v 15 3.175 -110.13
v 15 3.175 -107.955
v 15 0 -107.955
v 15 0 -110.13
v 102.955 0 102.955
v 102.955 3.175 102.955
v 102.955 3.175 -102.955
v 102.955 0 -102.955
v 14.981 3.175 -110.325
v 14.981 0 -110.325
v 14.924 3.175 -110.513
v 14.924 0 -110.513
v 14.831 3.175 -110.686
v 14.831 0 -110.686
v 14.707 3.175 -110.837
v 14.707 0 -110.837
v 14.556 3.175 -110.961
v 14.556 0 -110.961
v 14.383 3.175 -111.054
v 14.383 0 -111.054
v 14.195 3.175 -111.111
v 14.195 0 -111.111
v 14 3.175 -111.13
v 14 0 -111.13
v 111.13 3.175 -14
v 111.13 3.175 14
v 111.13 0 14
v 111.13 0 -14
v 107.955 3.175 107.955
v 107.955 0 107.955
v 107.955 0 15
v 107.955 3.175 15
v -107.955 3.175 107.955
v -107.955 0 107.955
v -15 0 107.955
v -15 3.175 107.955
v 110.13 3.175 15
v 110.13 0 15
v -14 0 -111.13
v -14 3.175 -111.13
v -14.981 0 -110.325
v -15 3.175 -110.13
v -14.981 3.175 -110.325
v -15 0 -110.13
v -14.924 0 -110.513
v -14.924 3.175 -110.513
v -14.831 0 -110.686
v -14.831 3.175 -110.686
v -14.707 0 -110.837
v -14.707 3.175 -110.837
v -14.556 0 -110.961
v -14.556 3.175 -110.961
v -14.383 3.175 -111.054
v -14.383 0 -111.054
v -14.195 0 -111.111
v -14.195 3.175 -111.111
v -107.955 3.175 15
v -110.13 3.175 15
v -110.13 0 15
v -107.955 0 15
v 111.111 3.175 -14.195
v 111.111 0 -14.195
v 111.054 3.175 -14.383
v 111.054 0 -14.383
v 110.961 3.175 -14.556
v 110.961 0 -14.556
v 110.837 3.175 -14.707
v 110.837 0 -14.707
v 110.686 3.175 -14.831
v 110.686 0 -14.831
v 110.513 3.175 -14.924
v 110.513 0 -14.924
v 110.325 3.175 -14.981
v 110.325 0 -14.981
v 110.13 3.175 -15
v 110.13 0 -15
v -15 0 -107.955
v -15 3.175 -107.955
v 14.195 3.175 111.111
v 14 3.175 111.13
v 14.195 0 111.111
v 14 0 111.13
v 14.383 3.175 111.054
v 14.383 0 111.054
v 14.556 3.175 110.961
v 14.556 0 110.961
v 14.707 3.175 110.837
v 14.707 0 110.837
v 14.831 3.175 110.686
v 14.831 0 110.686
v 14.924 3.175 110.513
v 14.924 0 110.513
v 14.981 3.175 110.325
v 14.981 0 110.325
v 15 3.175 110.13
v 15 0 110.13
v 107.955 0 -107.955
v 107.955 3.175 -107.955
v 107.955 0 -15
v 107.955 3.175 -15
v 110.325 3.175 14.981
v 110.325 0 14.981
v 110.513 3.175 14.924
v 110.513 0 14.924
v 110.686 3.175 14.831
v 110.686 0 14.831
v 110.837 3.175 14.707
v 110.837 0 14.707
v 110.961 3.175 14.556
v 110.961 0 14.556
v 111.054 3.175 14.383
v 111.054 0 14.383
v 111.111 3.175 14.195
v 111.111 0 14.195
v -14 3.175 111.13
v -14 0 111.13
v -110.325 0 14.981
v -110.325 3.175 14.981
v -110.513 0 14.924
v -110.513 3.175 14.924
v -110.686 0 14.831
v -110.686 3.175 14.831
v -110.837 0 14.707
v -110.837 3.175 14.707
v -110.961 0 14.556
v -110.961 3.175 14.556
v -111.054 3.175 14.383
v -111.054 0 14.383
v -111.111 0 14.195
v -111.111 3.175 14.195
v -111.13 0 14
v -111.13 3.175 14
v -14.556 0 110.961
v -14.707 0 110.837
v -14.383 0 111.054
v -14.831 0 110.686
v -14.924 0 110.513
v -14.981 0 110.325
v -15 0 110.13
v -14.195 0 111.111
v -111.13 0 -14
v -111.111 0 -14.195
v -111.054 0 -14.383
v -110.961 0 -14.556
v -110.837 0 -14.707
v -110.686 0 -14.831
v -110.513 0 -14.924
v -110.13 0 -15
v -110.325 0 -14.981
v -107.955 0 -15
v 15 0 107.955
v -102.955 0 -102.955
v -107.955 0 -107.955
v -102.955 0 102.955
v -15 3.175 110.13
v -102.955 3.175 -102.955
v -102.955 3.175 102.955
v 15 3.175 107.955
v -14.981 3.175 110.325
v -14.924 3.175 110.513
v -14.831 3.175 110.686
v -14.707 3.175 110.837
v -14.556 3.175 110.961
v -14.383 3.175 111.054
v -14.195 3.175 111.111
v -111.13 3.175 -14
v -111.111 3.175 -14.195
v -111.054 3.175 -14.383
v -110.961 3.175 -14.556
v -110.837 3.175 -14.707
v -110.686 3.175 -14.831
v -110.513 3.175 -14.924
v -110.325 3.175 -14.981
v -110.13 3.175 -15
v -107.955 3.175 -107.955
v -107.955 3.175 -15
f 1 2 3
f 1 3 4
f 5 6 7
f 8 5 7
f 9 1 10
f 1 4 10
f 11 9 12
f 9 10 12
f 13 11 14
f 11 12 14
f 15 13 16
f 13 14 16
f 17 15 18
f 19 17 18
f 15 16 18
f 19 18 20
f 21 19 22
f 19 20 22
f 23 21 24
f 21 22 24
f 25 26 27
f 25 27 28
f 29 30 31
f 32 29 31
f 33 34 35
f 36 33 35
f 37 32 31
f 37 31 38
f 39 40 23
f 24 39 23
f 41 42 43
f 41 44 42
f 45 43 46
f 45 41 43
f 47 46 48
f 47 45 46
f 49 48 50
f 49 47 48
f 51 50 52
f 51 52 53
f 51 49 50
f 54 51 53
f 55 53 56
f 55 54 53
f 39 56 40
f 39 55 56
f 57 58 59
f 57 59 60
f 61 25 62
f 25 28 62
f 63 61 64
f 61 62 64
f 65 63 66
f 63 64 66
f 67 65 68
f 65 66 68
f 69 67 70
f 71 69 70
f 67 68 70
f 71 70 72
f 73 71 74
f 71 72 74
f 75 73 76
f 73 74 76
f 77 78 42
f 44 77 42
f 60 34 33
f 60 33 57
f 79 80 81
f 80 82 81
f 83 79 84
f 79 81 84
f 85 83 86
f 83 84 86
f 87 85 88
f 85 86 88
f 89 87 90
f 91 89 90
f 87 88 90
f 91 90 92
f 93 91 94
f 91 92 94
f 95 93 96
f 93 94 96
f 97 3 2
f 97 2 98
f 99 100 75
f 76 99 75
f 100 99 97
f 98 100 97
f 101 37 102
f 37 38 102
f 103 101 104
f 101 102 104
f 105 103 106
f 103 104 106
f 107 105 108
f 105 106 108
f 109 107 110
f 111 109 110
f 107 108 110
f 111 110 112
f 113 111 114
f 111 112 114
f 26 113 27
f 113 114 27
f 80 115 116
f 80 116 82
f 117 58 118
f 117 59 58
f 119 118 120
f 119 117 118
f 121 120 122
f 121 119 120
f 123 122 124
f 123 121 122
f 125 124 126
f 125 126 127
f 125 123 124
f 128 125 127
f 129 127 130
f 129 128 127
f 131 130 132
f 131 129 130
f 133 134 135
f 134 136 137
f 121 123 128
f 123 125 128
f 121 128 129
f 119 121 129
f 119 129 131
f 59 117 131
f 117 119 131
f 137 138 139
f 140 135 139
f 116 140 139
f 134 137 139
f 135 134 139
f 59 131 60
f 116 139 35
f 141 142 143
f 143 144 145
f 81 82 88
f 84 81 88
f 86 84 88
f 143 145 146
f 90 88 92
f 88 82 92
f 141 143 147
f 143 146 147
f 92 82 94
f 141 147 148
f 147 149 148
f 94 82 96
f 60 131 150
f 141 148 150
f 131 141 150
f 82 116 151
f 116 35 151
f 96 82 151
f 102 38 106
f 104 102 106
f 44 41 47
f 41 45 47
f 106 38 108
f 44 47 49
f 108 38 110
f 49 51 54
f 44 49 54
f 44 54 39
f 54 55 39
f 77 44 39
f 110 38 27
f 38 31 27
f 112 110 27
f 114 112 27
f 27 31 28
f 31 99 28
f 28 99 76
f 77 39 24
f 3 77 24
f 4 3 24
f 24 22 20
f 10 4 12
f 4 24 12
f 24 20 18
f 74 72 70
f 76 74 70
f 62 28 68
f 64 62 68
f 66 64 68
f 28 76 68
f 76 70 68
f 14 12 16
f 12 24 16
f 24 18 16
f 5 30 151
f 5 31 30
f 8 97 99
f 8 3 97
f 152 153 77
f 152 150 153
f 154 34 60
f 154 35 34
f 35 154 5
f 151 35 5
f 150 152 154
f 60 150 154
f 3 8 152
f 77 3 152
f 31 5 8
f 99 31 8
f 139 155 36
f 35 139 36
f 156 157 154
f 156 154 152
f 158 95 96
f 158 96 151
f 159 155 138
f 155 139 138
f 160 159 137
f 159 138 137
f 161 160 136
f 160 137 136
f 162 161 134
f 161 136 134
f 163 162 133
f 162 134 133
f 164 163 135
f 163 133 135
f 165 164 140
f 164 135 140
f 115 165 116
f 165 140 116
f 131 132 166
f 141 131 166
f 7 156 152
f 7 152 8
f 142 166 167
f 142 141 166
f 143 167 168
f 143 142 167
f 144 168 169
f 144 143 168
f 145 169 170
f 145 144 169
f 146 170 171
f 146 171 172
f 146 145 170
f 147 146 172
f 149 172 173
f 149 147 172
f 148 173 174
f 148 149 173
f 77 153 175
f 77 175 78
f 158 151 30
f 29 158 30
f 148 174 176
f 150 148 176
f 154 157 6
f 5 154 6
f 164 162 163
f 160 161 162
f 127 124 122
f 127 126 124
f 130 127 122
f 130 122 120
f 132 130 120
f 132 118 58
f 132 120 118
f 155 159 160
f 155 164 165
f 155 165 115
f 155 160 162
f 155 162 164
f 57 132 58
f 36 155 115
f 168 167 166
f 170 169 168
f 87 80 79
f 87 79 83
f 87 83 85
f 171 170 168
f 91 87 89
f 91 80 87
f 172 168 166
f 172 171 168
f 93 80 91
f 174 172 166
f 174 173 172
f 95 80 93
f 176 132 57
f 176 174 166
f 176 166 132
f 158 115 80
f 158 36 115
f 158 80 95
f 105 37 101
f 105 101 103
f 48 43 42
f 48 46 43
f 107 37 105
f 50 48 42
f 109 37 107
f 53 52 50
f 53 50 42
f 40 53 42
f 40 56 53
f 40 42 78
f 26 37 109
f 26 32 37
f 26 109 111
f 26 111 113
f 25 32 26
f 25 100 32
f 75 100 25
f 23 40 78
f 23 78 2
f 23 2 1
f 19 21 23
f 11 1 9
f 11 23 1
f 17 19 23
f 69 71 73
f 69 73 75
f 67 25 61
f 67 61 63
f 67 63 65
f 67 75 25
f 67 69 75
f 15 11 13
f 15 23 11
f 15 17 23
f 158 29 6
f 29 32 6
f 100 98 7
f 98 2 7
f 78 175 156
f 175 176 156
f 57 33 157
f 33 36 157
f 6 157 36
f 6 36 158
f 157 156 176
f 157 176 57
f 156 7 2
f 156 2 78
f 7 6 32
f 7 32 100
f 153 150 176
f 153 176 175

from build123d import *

# Parameters (mm, degrees)
SKETCH1_W           = 215.91
SKETCH1_H           = 215.91
BOSS_EXTRUDE1_DEPTH = 3.175
SKETCH2_W           = 205.91
SKETCH2_H           = 205.91
CUT_EXTRUDE1_DEPTH  = 4.175
SKETCH4_W           = 3.175
SKETCH4_H           = 30
SKETCH4_W_2         = 30
SKETCH4_H_2         = 3.175
BOSS_EXTRUDE2_DEPTH = 3.175
FILLET1_R           = 1


with BuildPart() as part:
    # Sketch1 → Boss-Extrude1 (new body)
    with BuildSketch(Plane(origin=(0, 0, 0), x_dir=(1, 0, 0), z_dir=(0, 1, 0))):
        Rectangle(SKETCH1_W, SKETCH1_H)
    extrude(amount=BOSS_EXTRUDE1_DEPTH)

    # Sketch2 → Cut-Extrude1 (cut, through all)
    with BuildSketch(Plane(origin=(0, 3.175, 0), x_dir=(1, 0, 0), z_dir=(0, 1, 0))):
        Rectangle(SKETCH2_W, SKETCH2_H)
    extrude(amount=-CUT_EXTRUDE1_DEPTH, mode=Mode.SUBTRACT)

    # Sketch4 → Boss-Extrude2 (add)
    with BuildSketch(Plane(origin=(0, 3.175, 0), x_dir=(1, 0, 0), z_dir=(0, 1, 0))):
        with Locations((-109.5425, 0)):
            Rectangle(SKETCH4_W, SKETCH4_H)
        with Locations((0, 109.5425)):
            Rectangle(SKETCH4_W_2, SKETCH4_H_2)
        with Locations((0, -109.5425)):
            Rectangle(SKETCH4_W_2, SKETCH4_H_2)
        with Locations((109.5425, 0)):
            Rectangle(SKETCH4_W, SKETCH4_H)
    extrude(amount=-BOSS_EXTRUDE2_DEPTH)

    # Fillet1
    fillet1_edges = [part.edges().sort_by_distance(p)[0] for p in [
        (-111.13, 1.5875, 15),
        (-111.13, 1.5875, -15),
        (-15, 1.5875, 111.13),
        (15, 1.5875, 111.13),
        (-15, 1.5875, -111.13),
        (15, 1.5875, -111.13),
        (111.13, 1.5875, 15),
        (111.13, 1.5875, -15),
    ]]
    fillet(fillet1_edges, radius=FILLET1_R)


solid = part.part
